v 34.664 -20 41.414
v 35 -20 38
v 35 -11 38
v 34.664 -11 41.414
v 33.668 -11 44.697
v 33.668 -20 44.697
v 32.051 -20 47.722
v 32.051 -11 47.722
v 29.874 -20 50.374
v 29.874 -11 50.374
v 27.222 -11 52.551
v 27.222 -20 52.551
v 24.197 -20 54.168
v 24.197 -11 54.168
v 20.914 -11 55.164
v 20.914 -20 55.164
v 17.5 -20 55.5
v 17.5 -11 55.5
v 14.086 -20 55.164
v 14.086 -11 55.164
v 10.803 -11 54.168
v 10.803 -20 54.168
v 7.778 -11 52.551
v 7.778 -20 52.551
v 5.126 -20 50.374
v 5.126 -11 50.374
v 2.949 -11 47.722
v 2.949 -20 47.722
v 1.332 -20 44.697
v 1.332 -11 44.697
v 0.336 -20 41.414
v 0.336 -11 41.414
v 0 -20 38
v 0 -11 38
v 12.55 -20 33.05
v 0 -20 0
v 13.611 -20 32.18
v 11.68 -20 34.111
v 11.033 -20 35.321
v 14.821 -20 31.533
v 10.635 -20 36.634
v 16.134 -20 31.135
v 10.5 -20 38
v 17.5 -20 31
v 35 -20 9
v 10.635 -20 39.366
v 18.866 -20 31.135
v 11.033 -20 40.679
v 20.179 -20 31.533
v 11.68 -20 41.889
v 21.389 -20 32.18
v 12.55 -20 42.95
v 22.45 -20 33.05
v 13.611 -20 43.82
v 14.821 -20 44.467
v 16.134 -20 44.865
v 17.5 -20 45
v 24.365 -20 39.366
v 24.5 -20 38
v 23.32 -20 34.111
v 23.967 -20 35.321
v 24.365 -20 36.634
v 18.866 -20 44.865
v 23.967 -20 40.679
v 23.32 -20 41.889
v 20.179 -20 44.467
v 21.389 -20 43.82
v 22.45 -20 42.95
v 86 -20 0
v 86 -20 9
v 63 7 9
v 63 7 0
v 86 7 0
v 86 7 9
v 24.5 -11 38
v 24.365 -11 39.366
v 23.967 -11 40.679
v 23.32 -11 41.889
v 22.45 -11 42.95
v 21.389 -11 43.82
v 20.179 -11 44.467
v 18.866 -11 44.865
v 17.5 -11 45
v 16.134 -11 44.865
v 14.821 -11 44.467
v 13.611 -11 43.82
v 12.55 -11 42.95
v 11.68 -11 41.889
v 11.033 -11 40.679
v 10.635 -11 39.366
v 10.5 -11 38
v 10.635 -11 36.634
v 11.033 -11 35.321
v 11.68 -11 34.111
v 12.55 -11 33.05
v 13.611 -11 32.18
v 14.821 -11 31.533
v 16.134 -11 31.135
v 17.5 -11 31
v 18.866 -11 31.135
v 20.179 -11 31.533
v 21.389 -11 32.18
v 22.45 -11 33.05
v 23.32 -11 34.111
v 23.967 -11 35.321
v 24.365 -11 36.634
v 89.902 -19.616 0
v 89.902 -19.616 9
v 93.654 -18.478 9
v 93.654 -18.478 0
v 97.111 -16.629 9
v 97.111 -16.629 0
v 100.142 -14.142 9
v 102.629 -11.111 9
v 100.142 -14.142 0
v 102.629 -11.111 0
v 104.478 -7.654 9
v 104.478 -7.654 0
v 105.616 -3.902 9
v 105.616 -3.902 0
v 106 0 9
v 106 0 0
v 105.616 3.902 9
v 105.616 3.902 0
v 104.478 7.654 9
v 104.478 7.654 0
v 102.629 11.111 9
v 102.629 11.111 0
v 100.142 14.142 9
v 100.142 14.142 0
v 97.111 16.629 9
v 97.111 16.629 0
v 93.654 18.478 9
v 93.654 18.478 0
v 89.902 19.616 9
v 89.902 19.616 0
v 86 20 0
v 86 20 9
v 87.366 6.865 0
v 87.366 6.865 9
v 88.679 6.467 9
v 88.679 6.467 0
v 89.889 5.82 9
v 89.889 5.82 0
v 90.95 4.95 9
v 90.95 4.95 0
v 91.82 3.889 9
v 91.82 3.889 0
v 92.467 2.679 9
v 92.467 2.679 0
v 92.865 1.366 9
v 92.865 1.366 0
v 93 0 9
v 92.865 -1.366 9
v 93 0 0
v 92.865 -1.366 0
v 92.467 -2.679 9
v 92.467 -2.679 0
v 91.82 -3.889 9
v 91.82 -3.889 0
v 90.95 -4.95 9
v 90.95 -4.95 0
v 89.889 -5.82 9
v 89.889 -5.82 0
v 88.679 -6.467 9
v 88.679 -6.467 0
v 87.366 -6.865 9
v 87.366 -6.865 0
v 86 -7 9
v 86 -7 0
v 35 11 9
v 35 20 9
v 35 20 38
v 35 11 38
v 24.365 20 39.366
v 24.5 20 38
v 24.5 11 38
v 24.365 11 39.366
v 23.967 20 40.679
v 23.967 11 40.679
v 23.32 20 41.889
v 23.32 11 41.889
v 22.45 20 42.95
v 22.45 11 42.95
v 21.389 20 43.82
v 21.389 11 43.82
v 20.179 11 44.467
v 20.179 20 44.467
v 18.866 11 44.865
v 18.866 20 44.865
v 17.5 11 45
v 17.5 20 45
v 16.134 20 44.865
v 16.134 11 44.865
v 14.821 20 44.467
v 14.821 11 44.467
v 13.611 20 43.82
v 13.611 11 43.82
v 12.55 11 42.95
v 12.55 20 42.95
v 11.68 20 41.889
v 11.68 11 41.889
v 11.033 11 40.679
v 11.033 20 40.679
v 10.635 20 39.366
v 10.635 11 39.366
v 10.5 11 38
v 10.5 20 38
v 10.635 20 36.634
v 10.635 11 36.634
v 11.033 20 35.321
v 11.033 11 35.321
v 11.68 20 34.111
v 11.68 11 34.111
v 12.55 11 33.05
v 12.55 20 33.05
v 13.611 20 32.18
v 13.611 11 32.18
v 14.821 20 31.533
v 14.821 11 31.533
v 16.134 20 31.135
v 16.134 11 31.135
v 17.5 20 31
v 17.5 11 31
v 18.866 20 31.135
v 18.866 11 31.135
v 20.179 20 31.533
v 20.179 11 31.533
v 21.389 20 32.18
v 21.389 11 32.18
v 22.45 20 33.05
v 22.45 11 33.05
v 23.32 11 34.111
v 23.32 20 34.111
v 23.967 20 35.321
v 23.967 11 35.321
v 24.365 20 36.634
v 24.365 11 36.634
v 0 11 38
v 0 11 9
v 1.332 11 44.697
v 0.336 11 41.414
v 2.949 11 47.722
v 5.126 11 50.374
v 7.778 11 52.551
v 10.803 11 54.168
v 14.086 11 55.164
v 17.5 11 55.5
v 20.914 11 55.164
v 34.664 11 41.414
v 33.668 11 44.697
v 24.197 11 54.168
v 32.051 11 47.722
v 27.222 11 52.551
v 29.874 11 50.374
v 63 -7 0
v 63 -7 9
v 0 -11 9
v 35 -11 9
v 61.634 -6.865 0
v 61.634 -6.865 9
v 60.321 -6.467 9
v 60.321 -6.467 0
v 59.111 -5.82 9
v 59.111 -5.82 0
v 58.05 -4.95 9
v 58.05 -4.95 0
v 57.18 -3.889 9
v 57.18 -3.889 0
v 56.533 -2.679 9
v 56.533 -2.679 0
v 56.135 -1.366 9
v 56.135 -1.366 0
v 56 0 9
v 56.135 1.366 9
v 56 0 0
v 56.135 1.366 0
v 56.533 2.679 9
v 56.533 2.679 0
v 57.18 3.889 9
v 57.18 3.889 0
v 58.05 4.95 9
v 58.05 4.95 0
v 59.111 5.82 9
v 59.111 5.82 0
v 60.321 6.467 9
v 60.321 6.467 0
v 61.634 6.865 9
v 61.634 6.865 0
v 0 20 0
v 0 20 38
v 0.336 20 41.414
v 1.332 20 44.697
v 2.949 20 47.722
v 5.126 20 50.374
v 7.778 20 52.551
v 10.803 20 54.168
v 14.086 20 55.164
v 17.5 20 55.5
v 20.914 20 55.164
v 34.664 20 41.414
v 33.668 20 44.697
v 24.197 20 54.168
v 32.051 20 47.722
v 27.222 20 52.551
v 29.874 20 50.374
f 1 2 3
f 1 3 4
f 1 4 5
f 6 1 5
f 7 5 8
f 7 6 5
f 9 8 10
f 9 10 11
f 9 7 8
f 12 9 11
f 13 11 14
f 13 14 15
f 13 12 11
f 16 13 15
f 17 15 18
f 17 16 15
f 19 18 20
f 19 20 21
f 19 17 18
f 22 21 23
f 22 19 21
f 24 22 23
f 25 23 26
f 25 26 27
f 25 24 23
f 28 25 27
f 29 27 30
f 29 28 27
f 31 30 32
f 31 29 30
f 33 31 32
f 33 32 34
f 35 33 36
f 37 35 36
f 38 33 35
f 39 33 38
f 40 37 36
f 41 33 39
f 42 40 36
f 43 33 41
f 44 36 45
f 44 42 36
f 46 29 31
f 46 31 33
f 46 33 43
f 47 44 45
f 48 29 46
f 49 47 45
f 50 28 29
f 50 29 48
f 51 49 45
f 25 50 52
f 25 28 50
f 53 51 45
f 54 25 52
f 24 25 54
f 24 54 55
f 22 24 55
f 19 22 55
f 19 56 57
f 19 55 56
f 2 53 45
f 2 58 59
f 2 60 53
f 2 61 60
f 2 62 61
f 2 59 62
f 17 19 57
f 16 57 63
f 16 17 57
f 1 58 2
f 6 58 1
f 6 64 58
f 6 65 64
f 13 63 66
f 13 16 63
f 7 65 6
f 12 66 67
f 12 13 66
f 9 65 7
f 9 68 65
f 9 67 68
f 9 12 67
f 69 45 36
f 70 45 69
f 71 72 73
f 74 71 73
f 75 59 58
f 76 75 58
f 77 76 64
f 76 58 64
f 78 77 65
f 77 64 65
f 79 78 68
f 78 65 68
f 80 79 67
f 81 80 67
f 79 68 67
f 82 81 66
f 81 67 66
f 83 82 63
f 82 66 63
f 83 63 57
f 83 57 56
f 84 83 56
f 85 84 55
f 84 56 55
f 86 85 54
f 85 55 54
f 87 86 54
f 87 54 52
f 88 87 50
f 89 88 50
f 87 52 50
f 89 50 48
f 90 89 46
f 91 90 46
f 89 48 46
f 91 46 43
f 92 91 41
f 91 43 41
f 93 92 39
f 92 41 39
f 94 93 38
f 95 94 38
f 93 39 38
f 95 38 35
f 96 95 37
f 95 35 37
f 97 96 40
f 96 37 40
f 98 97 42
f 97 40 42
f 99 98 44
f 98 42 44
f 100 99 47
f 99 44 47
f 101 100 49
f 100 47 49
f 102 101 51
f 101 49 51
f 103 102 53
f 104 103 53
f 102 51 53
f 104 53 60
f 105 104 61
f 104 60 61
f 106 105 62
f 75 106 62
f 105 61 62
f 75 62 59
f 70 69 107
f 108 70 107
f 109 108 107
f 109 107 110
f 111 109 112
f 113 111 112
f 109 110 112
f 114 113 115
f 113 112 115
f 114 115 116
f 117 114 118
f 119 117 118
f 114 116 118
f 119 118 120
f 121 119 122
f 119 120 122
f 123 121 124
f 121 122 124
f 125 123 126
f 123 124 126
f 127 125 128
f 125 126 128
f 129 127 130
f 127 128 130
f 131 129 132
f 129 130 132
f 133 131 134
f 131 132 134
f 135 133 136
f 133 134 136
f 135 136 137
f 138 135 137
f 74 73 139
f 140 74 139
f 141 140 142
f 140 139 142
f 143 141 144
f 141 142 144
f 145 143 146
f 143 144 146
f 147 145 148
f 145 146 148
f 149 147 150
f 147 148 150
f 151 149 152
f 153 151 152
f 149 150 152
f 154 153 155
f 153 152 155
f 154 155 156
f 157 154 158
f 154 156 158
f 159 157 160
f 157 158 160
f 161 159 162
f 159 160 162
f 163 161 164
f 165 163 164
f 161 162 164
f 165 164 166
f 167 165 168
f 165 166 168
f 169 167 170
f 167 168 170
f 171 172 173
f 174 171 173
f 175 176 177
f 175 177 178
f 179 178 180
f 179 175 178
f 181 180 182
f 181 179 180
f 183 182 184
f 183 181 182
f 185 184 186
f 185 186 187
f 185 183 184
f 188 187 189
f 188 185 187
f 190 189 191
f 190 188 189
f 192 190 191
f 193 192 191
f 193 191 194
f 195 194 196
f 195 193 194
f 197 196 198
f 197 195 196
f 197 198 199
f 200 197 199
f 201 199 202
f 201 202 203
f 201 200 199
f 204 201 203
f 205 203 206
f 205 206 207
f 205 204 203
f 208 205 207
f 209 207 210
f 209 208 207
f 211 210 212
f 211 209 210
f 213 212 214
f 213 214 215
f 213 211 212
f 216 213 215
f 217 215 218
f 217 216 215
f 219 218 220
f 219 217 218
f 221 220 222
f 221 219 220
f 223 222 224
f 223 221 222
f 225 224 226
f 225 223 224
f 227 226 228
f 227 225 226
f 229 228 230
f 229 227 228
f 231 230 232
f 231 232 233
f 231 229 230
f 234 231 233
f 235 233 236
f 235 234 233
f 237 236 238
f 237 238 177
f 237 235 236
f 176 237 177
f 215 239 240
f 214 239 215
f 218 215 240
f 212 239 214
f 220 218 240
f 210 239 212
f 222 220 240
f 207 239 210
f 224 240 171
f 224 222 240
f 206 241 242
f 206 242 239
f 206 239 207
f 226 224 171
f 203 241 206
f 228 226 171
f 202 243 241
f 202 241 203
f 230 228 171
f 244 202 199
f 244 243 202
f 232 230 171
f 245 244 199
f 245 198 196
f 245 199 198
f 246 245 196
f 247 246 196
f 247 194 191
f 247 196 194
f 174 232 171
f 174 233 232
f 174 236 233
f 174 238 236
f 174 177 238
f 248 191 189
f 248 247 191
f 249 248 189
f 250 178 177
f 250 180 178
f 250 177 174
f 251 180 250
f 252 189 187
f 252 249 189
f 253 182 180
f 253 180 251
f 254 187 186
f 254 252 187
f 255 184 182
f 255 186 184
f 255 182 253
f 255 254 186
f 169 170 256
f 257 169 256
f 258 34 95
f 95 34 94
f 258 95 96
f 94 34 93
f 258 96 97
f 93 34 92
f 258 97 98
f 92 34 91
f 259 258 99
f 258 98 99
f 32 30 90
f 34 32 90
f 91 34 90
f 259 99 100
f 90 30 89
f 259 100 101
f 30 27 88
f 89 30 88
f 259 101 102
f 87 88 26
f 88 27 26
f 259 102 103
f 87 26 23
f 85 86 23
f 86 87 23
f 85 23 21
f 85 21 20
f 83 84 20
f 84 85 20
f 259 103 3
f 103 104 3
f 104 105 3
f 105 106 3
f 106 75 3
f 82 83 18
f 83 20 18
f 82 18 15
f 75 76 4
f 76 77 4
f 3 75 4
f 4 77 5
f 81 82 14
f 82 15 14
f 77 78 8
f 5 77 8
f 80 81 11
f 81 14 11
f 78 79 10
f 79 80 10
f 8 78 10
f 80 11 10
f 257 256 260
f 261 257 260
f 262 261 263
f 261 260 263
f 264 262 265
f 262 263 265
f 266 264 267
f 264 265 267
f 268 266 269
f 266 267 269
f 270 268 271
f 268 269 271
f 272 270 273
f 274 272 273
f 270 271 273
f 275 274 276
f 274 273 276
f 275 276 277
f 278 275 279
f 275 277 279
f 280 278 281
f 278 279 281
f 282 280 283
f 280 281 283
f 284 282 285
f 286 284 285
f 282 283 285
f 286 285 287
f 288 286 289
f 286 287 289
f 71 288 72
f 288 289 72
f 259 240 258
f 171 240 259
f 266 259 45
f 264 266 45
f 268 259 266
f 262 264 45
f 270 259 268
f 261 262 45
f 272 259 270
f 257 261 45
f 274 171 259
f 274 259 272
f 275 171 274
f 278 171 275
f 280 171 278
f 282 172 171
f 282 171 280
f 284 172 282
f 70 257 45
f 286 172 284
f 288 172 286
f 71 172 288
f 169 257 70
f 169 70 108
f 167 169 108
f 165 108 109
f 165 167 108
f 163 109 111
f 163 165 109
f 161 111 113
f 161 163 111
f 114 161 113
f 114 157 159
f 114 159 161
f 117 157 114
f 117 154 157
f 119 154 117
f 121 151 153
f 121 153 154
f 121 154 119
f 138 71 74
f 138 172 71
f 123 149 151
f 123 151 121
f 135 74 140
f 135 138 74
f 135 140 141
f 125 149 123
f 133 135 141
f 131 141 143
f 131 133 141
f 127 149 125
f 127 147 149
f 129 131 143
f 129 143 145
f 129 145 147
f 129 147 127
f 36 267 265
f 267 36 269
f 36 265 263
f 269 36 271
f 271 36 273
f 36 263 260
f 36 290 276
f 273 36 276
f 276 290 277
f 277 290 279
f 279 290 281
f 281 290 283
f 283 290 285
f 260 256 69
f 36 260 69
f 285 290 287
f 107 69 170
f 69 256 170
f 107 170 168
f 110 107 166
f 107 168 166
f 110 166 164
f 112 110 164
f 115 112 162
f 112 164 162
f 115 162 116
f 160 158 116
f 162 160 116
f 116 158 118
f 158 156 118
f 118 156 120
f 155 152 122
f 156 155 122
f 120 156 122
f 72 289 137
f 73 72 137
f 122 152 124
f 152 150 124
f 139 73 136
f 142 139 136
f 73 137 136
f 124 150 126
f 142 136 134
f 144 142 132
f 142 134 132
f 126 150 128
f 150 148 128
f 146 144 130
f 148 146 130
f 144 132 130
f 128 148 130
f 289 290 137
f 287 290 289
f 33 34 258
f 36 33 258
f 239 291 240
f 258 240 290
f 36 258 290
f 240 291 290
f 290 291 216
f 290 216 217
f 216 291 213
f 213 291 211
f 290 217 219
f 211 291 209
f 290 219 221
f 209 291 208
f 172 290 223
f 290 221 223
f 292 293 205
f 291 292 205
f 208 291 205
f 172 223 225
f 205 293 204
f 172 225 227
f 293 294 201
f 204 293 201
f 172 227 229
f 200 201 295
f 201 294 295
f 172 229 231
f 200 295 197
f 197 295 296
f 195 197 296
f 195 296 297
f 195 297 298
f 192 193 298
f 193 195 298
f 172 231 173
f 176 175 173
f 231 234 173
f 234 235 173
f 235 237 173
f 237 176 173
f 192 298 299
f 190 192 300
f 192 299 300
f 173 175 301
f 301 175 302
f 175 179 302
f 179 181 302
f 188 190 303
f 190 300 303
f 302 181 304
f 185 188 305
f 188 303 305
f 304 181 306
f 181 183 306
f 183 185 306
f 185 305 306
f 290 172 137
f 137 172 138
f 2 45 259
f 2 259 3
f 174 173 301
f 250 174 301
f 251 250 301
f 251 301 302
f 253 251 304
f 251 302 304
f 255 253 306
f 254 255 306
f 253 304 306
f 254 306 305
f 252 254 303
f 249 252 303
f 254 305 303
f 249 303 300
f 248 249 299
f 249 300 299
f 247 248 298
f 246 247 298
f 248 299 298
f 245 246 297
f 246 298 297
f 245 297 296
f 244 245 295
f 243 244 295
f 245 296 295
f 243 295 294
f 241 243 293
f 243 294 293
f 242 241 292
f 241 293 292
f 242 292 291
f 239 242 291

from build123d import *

# Parameters (mm, degrees)
BOSS_EXTRUDE1_DEPTH = 9
SKETCH3_R           = 17.5
SKETCH3_R_2         = 7
SKETCH3_W           = 35
SKETCH3_H           = 9
BOSS_EXTRUDE2_DEPTH = 9


with BuildPart() as part:
    # Sketch1 → Boss-Extrude1 (new body)
    with BuildSketch(Plane.XY):
        with BuildLine():
            Line((0, -20), (86, -20))
            ThreePointArc((86, -20), (106, 0), (86, 20))
            Line((86, 20), (0, 20))
            Line((0, 20), (0, -20))
        make_face()
        with BuildLine():
            Line((63, 7), (86, 7))
            ThreePointArc((86, 7), (93, 0), (86, -7))
            Line((86, -7), (63, -7))
            ThreePointArc((63, -7), (56, 0), (63, 7))
        make_face(mode=Mode.SUBTRACT)
    extrude(amount=BOSS_EXTRUDE1_DEPTH)

    # Sketch3 → Boss-Extrude2 (add)
    with BuildSketch(Plane.XZ.offset(20)):
        with BuildLine():
            Line((0, 38), (0, 9))
            Line((0, 9), (35, 9))
            Line((35, 9), (35, 38))
            ThreePointArc((35, 38), (17.5, 20.5), (0, 38))
        make_face()
        with Locations((17.5, 38)):
            Circle(SKETCH3_R)
        with Locations((17.5, 38)):
            Circle(SKETCH3_R_2, mode=Mode.SUBTRACT)
        with Locations((17.5, 4.5)):
            Rectangle(SKETCH3_W, SKETCH3_H)
    boss_extrude2 = extrude(amount=-BOSS_EXTRUDE2_DEPTH)

    # Mirror1: Boss-Extrude2 across plane
    add(boss_extrude2.mirror(Plane.ZX))


solid = part.part
